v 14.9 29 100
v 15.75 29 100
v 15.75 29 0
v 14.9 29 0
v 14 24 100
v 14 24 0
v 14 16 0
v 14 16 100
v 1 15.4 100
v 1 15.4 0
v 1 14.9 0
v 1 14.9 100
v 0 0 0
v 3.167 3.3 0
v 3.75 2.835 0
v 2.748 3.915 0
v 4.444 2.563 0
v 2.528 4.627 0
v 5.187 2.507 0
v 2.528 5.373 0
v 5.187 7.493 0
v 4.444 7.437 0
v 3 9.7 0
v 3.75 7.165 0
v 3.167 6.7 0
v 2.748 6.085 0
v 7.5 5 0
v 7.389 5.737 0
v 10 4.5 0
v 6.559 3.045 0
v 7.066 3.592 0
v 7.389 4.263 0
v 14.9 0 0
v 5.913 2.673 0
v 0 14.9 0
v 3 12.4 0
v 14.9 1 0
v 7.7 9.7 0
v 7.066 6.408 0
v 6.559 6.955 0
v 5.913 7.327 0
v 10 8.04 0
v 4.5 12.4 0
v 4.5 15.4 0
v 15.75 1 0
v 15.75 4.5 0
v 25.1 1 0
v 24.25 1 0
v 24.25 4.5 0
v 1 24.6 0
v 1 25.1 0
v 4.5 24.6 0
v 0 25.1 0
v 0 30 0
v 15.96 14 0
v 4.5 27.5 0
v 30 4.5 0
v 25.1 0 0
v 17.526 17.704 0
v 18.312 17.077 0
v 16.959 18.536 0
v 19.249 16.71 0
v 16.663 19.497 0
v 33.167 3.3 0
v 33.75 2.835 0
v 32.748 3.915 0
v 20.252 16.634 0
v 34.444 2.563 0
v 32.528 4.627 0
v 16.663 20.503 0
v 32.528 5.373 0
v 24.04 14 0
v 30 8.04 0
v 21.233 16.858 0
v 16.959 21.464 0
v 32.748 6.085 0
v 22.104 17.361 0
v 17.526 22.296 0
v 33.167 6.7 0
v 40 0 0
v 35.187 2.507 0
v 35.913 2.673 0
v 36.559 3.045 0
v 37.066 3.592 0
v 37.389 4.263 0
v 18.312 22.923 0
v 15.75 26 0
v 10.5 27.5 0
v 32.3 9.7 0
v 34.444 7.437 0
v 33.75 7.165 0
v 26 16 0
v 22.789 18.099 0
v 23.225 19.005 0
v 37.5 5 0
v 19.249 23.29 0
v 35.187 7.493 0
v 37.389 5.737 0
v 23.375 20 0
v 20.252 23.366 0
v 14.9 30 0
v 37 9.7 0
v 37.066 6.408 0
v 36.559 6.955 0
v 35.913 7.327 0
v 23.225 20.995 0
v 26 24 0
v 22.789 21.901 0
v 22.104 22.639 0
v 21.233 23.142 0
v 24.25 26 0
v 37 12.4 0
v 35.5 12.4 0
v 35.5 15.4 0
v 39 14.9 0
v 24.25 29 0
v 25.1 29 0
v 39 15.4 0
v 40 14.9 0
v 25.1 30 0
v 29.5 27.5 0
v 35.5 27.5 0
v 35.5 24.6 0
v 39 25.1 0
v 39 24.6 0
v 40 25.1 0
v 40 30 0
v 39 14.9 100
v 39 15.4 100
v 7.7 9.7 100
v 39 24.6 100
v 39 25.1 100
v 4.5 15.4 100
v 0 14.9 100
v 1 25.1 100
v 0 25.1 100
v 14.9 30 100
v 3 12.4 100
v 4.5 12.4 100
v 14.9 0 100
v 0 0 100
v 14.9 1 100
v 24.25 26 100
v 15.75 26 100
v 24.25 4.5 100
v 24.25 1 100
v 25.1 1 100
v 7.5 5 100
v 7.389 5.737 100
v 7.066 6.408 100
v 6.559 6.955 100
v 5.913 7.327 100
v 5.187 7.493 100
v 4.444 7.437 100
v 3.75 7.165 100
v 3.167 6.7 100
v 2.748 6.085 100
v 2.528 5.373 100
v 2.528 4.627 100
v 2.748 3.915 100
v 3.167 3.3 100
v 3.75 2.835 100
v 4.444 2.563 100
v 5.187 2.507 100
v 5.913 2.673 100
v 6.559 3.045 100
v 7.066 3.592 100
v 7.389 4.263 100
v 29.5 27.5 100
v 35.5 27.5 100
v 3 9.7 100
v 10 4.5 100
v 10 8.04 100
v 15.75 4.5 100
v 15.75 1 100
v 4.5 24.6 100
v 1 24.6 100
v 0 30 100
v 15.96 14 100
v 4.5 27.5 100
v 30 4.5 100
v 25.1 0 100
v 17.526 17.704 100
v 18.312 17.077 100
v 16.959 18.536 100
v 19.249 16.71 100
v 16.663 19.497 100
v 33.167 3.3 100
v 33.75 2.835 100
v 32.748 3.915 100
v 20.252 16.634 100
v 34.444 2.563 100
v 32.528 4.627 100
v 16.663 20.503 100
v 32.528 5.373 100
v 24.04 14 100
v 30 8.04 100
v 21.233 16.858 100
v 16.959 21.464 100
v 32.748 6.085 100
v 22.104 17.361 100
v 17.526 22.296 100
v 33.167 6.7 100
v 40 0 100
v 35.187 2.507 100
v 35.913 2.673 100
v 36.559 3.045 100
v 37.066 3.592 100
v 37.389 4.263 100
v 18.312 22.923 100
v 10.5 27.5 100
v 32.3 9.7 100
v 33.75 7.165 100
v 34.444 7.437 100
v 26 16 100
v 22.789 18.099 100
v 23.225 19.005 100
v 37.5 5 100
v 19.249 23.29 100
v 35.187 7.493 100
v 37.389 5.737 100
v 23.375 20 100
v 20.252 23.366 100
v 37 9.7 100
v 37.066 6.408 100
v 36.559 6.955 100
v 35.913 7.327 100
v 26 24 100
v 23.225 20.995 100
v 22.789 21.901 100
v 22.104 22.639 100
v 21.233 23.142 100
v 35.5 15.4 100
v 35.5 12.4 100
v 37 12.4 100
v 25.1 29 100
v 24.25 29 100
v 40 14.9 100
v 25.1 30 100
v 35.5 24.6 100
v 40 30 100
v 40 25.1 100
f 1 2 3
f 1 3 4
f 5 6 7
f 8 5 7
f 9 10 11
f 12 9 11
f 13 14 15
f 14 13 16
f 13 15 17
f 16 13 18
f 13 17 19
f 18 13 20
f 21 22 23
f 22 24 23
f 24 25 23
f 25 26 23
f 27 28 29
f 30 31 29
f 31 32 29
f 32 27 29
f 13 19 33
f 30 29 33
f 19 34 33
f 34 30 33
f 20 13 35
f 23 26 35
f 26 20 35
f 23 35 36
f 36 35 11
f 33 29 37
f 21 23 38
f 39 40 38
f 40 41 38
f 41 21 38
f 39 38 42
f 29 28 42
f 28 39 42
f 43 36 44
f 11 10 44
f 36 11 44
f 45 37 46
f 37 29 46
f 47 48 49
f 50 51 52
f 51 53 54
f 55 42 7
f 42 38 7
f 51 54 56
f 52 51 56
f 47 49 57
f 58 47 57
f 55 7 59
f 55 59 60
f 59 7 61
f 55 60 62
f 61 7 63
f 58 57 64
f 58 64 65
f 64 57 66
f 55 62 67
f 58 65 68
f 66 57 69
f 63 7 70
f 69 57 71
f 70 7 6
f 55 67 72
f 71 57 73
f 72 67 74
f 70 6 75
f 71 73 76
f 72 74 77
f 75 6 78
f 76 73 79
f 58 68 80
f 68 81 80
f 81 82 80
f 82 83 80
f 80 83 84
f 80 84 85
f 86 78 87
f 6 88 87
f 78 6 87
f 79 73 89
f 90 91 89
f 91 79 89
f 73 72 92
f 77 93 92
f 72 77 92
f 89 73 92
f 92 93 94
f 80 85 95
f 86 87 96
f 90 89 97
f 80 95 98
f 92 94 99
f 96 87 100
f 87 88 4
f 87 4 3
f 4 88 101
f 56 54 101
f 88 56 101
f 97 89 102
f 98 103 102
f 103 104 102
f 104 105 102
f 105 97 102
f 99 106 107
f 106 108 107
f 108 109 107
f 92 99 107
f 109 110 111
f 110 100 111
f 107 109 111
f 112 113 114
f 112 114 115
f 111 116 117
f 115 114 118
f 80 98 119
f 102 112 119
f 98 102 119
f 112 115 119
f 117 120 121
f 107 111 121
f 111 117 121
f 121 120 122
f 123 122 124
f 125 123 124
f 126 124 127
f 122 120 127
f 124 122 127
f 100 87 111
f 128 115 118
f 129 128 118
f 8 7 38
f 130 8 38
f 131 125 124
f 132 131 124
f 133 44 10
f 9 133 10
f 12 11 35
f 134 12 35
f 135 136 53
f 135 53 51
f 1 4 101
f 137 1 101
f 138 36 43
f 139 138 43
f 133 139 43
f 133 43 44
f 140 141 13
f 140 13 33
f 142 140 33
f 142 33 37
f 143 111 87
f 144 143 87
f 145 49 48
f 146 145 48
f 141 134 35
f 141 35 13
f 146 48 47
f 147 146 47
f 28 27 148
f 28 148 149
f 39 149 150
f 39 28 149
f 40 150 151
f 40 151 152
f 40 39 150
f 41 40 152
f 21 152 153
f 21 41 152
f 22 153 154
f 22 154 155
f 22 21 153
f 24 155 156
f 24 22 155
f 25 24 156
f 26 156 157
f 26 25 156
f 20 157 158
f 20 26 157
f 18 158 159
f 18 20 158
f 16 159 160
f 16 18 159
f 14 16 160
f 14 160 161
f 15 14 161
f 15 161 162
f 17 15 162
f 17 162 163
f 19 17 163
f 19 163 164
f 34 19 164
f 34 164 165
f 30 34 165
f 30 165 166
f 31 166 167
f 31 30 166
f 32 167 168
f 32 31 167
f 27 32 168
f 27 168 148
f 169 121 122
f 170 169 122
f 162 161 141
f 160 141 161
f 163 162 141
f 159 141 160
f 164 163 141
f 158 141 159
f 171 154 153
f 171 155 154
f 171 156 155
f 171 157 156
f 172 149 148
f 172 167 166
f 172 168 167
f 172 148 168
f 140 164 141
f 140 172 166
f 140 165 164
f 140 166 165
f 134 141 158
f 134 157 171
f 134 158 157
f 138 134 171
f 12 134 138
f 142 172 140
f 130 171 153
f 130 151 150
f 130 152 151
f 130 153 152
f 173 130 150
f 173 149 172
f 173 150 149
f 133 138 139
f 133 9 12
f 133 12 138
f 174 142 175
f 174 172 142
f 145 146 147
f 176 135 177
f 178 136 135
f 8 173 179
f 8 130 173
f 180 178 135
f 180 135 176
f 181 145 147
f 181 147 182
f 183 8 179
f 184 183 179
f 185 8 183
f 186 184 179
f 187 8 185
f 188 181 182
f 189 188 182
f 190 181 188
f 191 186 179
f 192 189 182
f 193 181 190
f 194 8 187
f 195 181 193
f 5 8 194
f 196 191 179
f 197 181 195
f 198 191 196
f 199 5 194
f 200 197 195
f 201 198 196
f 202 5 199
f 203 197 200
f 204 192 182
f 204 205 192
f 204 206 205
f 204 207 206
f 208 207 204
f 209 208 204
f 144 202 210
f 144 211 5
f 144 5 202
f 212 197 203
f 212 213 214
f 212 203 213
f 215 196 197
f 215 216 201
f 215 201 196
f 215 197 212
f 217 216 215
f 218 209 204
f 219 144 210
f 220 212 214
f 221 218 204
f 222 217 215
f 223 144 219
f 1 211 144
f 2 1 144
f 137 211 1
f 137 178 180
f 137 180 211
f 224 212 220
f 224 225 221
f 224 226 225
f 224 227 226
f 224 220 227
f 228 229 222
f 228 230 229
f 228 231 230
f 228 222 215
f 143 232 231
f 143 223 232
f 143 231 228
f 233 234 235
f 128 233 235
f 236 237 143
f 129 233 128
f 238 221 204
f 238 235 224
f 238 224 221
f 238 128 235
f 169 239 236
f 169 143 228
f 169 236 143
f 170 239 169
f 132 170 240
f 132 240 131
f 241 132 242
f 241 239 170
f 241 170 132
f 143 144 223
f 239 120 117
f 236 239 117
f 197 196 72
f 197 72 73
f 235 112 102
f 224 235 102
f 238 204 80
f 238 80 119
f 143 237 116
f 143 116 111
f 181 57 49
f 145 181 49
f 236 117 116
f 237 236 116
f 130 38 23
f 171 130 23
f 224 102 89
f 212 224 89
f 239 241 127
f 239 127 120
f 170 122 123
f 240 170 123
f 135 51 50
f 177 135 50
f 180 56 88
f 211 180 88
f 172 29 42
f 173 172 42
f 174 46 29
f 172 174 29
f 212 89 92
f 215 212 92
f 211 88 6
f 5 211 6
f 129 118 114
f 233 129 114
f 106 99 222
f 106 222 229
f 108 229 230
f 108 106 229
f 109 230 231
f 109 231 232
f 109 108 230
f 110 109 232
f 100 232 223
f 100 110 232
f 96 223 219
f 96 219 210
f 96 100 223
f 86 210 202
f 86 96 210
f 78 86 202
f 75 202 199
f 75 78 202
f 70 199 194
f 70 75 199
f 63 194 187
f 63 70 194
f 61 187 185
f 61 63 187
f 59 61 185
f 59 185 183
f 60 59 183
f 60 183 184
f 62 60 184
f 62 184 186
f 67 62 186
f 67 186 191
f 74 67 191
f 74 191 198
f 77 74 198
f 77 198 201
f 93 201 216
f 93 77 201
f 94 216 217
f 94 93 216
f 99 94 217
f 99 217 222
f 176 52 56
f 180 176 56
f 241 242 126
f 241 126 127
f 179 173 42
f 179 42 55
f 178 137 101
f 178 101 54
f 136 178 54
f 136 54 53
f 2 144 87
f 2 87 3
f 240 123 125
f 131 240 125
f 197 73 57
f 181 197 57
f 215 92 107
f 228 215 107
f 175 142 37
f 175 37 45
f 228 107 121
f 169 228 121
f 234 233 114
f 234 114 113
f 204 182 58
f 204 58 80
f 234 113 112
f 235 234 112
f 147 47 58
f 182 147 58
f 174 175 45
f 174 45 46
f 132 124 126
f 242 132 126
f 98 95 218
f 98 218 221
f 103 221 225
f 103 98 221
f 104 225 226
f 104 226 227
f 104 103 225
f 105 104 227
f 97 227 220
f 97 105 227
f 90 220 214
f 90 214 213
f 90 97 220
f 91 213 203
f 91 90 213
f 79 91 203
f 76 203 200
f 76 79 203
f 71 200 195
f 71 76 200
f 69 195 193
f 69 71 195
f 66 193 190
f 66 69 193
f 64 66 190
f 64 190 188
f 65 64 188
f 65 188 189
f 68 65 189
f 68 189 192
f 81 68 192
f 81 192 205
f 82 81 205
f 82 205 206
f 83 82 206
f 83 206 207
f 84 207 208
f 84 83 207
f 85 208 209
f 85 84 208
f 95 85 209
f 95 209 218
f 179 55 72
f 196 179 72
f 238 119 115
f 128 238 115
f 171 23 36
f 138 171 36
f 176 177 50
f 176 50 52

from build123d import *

# Parameters (mm, degrees)
SKETCH_1_R      = 3.375
SKETCH_1_R_2    = 2.5
EXTRUDE_1_DEPTH = 100


with BuildPart() as part:
    # 草图1 → 凸台-拉伸1 (new body)
    with BuildSketch(Plane.XY):
        Polygon((0, 0), (14.9, 0), (14.9, 1), (15.75, 1), (15.75, 4.5), (10, 4.5), (10, 8.040202025), (15.959797975, 14), (24.040202025, 14), (30, 8.040202025), (30, 4.5), (24.25, 4.5), (24.25, 1), (25.1, 1), (25.1, 0), (40, 0), (40, 14.9), (39, 14.9), (39, 15.4), (35.5, 15.4), (35.5, 12.4), (37, 12.4), (37, 9.7), (32.3, 9.7), (26, 16), (26, 24), (29.5, 27.5), (35.5, 27.5), (35.5, 24.6), (39, 24.6), (39, 25.1), (40, 25.1), (40, 30), (25.1, 30), (25.1, 29), (24.25, 29), (24.25, 26), (15.75, 26), (15.75, 29), (14.9, 29), (14.9, 30), (0, 30), (0, 25.1), (1, 25.1), (1, 24.6), (4.5, 24.6), (4.5, 27.5), (10.5, 27.5), (14, 24), (14, 16), (7.7, 9.7), (3, 9.7), (3, 12.4), (4.5, 12.4), (4.5, 15.4), (1, 15.4), (1, 14.9), (0, 14.9), align=None)
        with Locations((20, 20)):
            Circle(SKETCH_1_R, mode=Mode.SUBTRACT)
        with Locations((35, 5)):
            Circle(SKETCH_1_R_2, mode=Mode.SUBTRACT)
        with Locations((5, 5)):
            Circle(SKETCH_1_R_2, mode=Mode.SUBTRACT)
    extrude(amount=EXTRUDE_1_DEPTH)


solid = part.part
